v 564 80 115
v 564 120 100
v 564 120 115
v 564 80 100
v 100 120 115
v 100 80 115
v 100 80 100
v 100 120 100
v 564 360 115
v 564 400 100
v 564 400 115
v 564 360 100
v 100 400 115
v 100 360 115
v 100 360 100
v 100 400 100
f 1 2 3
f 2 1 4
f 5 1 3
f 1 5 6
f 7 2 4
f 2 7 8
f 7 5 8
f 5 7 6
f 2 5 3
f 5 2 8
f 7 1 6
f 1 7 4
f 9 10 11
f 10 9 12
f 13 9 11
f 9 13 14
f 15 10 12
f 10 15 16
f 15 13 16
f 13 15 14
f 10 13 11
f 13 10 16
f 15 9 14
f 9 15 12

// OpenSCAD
// file: lib/generated_constants.scad
// AUTO-GENERATED from simulation/sizing.py — do not hand edit
P_target_W = 10.0;
A_mem_m2 = 0.72;
active_w = 200.0;
active_h = 300.0;
n_plates = 12;
housing_od = 280.0;
housing_len = 264;
bolt_circle = 240.0;
frame_L = 664;
frame_W = 480.0;
frame_H = 900;
delta_P_bar = 34.58;
plate_pitch = 12;
// main file
include <lib/generated_constants.scad>

module mount_rail() {
  for (y = [80, frame_W - 120])
    translate([100, y, 100])
      cube([frame_L - 200, 40, 15]);
}
mount_rail();
